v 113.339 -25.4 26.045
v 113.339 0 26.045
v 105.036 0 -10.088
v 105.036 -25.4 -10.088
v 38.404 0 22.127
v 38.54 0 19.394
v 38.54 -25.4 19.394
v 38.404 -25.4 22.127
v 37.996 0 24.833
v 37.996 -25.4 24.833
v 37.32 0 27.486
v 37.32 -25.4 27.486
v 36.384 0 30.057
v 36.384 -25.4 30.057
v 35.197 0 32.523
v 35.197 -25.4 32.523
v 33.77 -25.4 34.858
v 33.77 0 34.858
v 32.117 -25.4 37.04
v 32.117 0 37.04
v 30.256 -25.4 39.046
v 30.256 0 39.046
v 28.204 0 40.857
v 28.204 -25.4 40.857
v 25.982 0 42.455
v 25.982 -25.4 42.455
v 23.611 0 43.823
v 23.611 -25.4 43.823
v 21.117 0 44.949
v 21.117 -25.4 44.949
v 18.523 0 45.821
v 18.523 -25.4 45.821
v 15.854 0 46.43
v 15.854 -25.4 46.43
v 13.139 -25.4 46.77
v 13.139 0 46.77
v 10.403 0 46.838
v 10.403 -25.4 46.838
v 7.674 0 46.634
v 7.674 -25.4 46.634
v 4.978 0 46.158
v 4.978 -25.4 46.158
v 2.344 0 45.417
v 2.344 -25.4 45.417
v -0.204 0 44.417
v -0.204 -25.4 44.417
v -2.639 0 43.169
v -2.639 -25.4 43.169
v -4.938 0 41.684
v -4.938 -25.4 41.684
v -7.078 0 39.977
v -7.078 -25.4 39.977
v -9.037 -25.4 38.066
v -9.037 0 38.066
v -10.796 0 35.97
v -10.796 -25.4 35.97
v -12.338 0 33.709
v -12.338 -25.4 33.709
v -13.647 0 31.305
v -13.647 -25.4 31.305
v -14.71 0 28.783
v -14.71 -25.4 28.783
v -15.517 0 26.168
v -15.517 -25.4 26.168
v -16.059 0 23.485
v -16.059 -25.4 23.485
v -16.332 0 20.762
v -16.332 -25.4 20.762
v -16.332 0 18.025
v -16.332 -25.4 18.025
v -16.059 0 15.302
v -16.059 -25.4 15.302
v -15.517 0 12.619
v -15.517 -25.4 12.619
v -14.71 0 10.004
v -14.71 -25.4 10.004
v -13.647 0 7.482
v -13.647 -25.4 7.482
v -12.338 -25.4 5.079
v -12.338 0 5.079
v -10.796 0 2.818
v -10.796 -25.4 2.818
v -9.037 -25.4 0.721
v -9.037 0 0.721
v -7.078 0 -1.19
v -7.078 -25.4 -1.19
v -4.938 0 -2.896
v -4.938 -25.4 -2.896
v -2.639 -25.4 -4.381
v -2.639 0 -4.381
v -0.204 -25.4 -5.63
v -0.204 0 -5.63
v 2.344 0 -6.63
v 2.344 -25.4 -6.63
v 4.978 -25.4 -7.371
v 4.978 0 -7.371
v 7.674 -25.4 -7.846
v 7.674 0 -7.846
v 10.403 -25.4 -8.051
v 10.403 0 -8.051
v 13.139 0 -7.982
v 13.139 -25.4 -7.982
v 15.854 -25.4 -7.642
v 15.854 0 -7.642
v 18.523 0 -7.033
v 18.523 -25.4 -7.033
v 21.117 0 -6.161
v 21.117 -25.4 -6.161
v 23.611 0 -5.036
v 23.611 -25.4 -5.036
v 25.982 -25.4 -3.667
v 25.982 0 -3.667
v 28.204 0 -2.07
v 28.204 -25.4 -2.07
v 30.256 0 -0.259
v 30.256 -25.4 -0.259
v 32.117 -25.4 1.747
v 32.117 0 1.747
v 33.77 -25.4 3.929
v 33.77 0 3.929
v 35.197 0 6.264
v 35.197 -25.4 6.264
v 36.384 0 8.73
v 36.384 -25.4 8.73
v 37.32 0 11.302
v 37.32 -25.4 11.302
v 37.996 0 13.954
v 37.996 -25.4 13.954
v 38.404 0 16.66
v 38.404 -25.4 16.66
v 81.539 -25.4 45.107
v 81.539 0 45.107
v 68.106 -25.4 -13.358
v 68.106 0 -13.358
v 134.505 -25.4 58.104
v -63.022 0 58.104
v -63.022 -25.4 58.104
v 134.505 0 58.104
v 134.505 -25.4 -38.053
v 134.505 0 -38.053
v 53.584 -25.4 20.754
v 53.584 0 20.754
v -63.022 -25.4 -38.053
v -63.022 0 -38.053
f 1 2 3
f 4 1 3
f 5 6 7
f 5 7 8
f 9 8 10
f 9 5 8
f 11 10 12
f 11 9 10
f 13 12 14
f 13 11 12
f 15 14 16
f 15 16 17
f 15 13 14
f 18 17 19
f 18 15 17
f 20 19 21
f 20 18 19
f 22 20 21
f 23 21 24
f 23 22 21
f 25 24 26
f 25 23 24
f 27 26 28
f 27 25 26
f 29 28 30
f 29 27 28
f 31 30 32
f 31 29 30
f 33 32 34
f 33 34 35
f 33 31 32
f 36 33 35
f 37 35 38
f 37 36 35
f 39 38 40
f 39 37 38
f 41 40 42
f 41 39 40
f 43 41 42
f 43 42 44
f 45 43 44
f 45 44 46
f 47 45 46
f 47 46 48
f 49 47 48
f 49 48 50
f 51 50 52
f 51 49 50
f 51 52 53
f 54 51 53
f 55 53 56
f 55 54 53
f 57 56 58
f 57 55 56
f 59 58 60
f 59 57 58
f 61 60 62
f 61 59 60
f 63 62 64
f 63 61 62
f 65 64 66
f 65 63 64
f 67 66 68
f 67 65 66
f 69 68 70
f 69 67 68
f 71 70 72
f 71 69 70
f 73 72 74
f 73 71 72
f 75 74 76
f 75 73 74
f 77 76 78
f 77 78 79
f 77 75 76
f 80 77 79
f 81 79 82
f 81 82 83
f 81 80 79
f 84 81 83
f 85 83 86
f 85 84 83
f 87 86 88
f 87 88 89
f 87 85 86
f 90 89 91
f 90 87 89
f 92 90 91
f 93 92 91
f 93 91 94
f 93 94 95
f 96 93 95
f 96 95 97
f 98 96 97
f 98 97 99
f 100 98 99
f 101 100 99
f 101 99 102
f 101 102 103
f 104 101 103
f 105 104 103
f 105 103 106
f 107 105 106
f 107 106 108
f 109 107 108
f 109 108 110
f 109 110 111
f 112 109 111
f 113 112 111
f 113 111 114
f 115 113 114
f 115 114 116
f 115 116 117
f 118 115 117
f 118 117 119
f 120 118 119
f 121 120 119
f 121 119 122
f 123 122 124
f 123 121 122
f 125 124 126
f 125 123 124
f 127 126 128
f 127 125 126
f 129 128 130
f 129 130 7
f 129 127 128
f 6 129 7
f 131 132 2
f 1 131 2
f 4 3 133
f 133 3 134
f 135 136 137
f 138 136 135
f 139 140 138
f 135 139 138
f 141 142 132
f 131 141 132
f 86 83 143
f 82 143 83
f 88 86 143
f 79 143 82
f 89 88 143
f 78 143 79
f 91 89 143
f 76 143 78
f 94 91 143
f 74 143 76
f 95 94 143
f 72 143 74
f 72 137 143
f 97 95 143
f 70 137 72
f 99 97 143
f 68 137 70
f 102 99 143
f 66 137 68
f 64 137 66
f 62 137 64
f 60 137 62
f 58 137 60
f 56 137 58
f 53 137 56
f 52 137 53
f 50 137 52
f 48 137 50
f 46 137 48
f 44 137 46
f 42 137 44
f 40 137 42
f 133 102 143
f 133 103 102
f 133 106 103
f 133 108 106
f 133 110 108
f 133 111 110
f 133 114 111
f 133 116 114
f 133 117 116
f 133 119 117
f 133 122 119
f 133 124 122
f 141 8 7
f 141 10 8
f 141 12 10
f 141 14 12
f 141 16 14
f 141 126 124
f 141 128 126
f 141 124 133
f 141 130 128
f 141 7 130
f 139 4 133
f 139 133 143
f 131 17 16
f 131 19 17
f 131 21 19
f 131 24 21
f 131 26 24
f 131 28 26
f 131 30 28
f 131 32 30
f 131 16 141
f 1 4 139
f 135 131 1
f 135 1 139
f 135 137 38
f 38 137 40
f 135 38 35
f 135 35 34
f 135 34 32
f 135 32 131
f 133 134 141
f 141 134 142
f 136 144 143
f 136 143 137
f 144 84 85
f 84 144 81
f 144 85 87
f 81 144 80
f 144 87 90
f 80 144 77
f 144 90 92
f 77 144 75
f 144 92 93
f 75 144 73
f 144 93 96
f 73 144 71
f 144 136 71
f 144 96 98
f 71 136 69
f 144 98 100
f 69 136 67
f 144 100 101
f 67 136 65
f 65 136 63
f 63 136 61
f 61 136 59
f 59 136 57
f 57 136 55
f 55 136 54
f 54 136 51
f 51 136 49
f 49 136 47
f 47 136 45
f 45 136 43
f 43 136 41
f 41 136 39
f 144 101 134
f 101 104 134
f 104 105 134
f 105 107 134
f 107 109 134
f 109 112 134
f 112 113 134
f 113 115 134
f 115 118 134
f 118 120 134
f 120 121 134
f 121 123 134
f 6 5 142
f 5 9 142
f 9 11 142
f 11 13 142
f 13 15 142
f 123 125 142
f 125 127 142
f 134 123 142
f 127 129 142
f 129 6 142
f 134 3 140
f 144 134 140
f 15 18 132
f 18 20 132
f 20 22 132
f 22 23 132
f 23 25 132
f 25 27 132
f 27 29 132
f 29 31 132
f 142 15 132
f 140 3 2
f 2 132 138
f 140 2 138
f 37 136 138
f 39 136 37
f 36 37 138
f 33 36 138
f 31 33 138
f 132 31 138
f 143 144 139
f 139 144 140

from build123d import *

# Parameters (mm, degrees)
F0_W     = 197.526522
F0_H     = 96.156877
F0_R     = 27.452888
F1_DEPTH = 25.4


with BuildPart() as f1:
    # F0 (on Front) → F1 (new body)
    with BuildSketch(Plane.XZ):
        with Locations((35.741519, 10.025931)):
            Rectangle(F0_W, F0_H)
        with Locations((11.08718, 19.393688)):
            Circle(F0_R, mode=Mode.SUBTRACT)
        Polygon((113.338566, 26.044908), (105.036274, -10.088419), (68.105889, -13.358281), (53.583948, 20.754159), (81.53928, 45.106669), align=None, mode=Mode.SUBTRACT)
    extrude(amount=F1_DEPTH)


solid = f1.part
